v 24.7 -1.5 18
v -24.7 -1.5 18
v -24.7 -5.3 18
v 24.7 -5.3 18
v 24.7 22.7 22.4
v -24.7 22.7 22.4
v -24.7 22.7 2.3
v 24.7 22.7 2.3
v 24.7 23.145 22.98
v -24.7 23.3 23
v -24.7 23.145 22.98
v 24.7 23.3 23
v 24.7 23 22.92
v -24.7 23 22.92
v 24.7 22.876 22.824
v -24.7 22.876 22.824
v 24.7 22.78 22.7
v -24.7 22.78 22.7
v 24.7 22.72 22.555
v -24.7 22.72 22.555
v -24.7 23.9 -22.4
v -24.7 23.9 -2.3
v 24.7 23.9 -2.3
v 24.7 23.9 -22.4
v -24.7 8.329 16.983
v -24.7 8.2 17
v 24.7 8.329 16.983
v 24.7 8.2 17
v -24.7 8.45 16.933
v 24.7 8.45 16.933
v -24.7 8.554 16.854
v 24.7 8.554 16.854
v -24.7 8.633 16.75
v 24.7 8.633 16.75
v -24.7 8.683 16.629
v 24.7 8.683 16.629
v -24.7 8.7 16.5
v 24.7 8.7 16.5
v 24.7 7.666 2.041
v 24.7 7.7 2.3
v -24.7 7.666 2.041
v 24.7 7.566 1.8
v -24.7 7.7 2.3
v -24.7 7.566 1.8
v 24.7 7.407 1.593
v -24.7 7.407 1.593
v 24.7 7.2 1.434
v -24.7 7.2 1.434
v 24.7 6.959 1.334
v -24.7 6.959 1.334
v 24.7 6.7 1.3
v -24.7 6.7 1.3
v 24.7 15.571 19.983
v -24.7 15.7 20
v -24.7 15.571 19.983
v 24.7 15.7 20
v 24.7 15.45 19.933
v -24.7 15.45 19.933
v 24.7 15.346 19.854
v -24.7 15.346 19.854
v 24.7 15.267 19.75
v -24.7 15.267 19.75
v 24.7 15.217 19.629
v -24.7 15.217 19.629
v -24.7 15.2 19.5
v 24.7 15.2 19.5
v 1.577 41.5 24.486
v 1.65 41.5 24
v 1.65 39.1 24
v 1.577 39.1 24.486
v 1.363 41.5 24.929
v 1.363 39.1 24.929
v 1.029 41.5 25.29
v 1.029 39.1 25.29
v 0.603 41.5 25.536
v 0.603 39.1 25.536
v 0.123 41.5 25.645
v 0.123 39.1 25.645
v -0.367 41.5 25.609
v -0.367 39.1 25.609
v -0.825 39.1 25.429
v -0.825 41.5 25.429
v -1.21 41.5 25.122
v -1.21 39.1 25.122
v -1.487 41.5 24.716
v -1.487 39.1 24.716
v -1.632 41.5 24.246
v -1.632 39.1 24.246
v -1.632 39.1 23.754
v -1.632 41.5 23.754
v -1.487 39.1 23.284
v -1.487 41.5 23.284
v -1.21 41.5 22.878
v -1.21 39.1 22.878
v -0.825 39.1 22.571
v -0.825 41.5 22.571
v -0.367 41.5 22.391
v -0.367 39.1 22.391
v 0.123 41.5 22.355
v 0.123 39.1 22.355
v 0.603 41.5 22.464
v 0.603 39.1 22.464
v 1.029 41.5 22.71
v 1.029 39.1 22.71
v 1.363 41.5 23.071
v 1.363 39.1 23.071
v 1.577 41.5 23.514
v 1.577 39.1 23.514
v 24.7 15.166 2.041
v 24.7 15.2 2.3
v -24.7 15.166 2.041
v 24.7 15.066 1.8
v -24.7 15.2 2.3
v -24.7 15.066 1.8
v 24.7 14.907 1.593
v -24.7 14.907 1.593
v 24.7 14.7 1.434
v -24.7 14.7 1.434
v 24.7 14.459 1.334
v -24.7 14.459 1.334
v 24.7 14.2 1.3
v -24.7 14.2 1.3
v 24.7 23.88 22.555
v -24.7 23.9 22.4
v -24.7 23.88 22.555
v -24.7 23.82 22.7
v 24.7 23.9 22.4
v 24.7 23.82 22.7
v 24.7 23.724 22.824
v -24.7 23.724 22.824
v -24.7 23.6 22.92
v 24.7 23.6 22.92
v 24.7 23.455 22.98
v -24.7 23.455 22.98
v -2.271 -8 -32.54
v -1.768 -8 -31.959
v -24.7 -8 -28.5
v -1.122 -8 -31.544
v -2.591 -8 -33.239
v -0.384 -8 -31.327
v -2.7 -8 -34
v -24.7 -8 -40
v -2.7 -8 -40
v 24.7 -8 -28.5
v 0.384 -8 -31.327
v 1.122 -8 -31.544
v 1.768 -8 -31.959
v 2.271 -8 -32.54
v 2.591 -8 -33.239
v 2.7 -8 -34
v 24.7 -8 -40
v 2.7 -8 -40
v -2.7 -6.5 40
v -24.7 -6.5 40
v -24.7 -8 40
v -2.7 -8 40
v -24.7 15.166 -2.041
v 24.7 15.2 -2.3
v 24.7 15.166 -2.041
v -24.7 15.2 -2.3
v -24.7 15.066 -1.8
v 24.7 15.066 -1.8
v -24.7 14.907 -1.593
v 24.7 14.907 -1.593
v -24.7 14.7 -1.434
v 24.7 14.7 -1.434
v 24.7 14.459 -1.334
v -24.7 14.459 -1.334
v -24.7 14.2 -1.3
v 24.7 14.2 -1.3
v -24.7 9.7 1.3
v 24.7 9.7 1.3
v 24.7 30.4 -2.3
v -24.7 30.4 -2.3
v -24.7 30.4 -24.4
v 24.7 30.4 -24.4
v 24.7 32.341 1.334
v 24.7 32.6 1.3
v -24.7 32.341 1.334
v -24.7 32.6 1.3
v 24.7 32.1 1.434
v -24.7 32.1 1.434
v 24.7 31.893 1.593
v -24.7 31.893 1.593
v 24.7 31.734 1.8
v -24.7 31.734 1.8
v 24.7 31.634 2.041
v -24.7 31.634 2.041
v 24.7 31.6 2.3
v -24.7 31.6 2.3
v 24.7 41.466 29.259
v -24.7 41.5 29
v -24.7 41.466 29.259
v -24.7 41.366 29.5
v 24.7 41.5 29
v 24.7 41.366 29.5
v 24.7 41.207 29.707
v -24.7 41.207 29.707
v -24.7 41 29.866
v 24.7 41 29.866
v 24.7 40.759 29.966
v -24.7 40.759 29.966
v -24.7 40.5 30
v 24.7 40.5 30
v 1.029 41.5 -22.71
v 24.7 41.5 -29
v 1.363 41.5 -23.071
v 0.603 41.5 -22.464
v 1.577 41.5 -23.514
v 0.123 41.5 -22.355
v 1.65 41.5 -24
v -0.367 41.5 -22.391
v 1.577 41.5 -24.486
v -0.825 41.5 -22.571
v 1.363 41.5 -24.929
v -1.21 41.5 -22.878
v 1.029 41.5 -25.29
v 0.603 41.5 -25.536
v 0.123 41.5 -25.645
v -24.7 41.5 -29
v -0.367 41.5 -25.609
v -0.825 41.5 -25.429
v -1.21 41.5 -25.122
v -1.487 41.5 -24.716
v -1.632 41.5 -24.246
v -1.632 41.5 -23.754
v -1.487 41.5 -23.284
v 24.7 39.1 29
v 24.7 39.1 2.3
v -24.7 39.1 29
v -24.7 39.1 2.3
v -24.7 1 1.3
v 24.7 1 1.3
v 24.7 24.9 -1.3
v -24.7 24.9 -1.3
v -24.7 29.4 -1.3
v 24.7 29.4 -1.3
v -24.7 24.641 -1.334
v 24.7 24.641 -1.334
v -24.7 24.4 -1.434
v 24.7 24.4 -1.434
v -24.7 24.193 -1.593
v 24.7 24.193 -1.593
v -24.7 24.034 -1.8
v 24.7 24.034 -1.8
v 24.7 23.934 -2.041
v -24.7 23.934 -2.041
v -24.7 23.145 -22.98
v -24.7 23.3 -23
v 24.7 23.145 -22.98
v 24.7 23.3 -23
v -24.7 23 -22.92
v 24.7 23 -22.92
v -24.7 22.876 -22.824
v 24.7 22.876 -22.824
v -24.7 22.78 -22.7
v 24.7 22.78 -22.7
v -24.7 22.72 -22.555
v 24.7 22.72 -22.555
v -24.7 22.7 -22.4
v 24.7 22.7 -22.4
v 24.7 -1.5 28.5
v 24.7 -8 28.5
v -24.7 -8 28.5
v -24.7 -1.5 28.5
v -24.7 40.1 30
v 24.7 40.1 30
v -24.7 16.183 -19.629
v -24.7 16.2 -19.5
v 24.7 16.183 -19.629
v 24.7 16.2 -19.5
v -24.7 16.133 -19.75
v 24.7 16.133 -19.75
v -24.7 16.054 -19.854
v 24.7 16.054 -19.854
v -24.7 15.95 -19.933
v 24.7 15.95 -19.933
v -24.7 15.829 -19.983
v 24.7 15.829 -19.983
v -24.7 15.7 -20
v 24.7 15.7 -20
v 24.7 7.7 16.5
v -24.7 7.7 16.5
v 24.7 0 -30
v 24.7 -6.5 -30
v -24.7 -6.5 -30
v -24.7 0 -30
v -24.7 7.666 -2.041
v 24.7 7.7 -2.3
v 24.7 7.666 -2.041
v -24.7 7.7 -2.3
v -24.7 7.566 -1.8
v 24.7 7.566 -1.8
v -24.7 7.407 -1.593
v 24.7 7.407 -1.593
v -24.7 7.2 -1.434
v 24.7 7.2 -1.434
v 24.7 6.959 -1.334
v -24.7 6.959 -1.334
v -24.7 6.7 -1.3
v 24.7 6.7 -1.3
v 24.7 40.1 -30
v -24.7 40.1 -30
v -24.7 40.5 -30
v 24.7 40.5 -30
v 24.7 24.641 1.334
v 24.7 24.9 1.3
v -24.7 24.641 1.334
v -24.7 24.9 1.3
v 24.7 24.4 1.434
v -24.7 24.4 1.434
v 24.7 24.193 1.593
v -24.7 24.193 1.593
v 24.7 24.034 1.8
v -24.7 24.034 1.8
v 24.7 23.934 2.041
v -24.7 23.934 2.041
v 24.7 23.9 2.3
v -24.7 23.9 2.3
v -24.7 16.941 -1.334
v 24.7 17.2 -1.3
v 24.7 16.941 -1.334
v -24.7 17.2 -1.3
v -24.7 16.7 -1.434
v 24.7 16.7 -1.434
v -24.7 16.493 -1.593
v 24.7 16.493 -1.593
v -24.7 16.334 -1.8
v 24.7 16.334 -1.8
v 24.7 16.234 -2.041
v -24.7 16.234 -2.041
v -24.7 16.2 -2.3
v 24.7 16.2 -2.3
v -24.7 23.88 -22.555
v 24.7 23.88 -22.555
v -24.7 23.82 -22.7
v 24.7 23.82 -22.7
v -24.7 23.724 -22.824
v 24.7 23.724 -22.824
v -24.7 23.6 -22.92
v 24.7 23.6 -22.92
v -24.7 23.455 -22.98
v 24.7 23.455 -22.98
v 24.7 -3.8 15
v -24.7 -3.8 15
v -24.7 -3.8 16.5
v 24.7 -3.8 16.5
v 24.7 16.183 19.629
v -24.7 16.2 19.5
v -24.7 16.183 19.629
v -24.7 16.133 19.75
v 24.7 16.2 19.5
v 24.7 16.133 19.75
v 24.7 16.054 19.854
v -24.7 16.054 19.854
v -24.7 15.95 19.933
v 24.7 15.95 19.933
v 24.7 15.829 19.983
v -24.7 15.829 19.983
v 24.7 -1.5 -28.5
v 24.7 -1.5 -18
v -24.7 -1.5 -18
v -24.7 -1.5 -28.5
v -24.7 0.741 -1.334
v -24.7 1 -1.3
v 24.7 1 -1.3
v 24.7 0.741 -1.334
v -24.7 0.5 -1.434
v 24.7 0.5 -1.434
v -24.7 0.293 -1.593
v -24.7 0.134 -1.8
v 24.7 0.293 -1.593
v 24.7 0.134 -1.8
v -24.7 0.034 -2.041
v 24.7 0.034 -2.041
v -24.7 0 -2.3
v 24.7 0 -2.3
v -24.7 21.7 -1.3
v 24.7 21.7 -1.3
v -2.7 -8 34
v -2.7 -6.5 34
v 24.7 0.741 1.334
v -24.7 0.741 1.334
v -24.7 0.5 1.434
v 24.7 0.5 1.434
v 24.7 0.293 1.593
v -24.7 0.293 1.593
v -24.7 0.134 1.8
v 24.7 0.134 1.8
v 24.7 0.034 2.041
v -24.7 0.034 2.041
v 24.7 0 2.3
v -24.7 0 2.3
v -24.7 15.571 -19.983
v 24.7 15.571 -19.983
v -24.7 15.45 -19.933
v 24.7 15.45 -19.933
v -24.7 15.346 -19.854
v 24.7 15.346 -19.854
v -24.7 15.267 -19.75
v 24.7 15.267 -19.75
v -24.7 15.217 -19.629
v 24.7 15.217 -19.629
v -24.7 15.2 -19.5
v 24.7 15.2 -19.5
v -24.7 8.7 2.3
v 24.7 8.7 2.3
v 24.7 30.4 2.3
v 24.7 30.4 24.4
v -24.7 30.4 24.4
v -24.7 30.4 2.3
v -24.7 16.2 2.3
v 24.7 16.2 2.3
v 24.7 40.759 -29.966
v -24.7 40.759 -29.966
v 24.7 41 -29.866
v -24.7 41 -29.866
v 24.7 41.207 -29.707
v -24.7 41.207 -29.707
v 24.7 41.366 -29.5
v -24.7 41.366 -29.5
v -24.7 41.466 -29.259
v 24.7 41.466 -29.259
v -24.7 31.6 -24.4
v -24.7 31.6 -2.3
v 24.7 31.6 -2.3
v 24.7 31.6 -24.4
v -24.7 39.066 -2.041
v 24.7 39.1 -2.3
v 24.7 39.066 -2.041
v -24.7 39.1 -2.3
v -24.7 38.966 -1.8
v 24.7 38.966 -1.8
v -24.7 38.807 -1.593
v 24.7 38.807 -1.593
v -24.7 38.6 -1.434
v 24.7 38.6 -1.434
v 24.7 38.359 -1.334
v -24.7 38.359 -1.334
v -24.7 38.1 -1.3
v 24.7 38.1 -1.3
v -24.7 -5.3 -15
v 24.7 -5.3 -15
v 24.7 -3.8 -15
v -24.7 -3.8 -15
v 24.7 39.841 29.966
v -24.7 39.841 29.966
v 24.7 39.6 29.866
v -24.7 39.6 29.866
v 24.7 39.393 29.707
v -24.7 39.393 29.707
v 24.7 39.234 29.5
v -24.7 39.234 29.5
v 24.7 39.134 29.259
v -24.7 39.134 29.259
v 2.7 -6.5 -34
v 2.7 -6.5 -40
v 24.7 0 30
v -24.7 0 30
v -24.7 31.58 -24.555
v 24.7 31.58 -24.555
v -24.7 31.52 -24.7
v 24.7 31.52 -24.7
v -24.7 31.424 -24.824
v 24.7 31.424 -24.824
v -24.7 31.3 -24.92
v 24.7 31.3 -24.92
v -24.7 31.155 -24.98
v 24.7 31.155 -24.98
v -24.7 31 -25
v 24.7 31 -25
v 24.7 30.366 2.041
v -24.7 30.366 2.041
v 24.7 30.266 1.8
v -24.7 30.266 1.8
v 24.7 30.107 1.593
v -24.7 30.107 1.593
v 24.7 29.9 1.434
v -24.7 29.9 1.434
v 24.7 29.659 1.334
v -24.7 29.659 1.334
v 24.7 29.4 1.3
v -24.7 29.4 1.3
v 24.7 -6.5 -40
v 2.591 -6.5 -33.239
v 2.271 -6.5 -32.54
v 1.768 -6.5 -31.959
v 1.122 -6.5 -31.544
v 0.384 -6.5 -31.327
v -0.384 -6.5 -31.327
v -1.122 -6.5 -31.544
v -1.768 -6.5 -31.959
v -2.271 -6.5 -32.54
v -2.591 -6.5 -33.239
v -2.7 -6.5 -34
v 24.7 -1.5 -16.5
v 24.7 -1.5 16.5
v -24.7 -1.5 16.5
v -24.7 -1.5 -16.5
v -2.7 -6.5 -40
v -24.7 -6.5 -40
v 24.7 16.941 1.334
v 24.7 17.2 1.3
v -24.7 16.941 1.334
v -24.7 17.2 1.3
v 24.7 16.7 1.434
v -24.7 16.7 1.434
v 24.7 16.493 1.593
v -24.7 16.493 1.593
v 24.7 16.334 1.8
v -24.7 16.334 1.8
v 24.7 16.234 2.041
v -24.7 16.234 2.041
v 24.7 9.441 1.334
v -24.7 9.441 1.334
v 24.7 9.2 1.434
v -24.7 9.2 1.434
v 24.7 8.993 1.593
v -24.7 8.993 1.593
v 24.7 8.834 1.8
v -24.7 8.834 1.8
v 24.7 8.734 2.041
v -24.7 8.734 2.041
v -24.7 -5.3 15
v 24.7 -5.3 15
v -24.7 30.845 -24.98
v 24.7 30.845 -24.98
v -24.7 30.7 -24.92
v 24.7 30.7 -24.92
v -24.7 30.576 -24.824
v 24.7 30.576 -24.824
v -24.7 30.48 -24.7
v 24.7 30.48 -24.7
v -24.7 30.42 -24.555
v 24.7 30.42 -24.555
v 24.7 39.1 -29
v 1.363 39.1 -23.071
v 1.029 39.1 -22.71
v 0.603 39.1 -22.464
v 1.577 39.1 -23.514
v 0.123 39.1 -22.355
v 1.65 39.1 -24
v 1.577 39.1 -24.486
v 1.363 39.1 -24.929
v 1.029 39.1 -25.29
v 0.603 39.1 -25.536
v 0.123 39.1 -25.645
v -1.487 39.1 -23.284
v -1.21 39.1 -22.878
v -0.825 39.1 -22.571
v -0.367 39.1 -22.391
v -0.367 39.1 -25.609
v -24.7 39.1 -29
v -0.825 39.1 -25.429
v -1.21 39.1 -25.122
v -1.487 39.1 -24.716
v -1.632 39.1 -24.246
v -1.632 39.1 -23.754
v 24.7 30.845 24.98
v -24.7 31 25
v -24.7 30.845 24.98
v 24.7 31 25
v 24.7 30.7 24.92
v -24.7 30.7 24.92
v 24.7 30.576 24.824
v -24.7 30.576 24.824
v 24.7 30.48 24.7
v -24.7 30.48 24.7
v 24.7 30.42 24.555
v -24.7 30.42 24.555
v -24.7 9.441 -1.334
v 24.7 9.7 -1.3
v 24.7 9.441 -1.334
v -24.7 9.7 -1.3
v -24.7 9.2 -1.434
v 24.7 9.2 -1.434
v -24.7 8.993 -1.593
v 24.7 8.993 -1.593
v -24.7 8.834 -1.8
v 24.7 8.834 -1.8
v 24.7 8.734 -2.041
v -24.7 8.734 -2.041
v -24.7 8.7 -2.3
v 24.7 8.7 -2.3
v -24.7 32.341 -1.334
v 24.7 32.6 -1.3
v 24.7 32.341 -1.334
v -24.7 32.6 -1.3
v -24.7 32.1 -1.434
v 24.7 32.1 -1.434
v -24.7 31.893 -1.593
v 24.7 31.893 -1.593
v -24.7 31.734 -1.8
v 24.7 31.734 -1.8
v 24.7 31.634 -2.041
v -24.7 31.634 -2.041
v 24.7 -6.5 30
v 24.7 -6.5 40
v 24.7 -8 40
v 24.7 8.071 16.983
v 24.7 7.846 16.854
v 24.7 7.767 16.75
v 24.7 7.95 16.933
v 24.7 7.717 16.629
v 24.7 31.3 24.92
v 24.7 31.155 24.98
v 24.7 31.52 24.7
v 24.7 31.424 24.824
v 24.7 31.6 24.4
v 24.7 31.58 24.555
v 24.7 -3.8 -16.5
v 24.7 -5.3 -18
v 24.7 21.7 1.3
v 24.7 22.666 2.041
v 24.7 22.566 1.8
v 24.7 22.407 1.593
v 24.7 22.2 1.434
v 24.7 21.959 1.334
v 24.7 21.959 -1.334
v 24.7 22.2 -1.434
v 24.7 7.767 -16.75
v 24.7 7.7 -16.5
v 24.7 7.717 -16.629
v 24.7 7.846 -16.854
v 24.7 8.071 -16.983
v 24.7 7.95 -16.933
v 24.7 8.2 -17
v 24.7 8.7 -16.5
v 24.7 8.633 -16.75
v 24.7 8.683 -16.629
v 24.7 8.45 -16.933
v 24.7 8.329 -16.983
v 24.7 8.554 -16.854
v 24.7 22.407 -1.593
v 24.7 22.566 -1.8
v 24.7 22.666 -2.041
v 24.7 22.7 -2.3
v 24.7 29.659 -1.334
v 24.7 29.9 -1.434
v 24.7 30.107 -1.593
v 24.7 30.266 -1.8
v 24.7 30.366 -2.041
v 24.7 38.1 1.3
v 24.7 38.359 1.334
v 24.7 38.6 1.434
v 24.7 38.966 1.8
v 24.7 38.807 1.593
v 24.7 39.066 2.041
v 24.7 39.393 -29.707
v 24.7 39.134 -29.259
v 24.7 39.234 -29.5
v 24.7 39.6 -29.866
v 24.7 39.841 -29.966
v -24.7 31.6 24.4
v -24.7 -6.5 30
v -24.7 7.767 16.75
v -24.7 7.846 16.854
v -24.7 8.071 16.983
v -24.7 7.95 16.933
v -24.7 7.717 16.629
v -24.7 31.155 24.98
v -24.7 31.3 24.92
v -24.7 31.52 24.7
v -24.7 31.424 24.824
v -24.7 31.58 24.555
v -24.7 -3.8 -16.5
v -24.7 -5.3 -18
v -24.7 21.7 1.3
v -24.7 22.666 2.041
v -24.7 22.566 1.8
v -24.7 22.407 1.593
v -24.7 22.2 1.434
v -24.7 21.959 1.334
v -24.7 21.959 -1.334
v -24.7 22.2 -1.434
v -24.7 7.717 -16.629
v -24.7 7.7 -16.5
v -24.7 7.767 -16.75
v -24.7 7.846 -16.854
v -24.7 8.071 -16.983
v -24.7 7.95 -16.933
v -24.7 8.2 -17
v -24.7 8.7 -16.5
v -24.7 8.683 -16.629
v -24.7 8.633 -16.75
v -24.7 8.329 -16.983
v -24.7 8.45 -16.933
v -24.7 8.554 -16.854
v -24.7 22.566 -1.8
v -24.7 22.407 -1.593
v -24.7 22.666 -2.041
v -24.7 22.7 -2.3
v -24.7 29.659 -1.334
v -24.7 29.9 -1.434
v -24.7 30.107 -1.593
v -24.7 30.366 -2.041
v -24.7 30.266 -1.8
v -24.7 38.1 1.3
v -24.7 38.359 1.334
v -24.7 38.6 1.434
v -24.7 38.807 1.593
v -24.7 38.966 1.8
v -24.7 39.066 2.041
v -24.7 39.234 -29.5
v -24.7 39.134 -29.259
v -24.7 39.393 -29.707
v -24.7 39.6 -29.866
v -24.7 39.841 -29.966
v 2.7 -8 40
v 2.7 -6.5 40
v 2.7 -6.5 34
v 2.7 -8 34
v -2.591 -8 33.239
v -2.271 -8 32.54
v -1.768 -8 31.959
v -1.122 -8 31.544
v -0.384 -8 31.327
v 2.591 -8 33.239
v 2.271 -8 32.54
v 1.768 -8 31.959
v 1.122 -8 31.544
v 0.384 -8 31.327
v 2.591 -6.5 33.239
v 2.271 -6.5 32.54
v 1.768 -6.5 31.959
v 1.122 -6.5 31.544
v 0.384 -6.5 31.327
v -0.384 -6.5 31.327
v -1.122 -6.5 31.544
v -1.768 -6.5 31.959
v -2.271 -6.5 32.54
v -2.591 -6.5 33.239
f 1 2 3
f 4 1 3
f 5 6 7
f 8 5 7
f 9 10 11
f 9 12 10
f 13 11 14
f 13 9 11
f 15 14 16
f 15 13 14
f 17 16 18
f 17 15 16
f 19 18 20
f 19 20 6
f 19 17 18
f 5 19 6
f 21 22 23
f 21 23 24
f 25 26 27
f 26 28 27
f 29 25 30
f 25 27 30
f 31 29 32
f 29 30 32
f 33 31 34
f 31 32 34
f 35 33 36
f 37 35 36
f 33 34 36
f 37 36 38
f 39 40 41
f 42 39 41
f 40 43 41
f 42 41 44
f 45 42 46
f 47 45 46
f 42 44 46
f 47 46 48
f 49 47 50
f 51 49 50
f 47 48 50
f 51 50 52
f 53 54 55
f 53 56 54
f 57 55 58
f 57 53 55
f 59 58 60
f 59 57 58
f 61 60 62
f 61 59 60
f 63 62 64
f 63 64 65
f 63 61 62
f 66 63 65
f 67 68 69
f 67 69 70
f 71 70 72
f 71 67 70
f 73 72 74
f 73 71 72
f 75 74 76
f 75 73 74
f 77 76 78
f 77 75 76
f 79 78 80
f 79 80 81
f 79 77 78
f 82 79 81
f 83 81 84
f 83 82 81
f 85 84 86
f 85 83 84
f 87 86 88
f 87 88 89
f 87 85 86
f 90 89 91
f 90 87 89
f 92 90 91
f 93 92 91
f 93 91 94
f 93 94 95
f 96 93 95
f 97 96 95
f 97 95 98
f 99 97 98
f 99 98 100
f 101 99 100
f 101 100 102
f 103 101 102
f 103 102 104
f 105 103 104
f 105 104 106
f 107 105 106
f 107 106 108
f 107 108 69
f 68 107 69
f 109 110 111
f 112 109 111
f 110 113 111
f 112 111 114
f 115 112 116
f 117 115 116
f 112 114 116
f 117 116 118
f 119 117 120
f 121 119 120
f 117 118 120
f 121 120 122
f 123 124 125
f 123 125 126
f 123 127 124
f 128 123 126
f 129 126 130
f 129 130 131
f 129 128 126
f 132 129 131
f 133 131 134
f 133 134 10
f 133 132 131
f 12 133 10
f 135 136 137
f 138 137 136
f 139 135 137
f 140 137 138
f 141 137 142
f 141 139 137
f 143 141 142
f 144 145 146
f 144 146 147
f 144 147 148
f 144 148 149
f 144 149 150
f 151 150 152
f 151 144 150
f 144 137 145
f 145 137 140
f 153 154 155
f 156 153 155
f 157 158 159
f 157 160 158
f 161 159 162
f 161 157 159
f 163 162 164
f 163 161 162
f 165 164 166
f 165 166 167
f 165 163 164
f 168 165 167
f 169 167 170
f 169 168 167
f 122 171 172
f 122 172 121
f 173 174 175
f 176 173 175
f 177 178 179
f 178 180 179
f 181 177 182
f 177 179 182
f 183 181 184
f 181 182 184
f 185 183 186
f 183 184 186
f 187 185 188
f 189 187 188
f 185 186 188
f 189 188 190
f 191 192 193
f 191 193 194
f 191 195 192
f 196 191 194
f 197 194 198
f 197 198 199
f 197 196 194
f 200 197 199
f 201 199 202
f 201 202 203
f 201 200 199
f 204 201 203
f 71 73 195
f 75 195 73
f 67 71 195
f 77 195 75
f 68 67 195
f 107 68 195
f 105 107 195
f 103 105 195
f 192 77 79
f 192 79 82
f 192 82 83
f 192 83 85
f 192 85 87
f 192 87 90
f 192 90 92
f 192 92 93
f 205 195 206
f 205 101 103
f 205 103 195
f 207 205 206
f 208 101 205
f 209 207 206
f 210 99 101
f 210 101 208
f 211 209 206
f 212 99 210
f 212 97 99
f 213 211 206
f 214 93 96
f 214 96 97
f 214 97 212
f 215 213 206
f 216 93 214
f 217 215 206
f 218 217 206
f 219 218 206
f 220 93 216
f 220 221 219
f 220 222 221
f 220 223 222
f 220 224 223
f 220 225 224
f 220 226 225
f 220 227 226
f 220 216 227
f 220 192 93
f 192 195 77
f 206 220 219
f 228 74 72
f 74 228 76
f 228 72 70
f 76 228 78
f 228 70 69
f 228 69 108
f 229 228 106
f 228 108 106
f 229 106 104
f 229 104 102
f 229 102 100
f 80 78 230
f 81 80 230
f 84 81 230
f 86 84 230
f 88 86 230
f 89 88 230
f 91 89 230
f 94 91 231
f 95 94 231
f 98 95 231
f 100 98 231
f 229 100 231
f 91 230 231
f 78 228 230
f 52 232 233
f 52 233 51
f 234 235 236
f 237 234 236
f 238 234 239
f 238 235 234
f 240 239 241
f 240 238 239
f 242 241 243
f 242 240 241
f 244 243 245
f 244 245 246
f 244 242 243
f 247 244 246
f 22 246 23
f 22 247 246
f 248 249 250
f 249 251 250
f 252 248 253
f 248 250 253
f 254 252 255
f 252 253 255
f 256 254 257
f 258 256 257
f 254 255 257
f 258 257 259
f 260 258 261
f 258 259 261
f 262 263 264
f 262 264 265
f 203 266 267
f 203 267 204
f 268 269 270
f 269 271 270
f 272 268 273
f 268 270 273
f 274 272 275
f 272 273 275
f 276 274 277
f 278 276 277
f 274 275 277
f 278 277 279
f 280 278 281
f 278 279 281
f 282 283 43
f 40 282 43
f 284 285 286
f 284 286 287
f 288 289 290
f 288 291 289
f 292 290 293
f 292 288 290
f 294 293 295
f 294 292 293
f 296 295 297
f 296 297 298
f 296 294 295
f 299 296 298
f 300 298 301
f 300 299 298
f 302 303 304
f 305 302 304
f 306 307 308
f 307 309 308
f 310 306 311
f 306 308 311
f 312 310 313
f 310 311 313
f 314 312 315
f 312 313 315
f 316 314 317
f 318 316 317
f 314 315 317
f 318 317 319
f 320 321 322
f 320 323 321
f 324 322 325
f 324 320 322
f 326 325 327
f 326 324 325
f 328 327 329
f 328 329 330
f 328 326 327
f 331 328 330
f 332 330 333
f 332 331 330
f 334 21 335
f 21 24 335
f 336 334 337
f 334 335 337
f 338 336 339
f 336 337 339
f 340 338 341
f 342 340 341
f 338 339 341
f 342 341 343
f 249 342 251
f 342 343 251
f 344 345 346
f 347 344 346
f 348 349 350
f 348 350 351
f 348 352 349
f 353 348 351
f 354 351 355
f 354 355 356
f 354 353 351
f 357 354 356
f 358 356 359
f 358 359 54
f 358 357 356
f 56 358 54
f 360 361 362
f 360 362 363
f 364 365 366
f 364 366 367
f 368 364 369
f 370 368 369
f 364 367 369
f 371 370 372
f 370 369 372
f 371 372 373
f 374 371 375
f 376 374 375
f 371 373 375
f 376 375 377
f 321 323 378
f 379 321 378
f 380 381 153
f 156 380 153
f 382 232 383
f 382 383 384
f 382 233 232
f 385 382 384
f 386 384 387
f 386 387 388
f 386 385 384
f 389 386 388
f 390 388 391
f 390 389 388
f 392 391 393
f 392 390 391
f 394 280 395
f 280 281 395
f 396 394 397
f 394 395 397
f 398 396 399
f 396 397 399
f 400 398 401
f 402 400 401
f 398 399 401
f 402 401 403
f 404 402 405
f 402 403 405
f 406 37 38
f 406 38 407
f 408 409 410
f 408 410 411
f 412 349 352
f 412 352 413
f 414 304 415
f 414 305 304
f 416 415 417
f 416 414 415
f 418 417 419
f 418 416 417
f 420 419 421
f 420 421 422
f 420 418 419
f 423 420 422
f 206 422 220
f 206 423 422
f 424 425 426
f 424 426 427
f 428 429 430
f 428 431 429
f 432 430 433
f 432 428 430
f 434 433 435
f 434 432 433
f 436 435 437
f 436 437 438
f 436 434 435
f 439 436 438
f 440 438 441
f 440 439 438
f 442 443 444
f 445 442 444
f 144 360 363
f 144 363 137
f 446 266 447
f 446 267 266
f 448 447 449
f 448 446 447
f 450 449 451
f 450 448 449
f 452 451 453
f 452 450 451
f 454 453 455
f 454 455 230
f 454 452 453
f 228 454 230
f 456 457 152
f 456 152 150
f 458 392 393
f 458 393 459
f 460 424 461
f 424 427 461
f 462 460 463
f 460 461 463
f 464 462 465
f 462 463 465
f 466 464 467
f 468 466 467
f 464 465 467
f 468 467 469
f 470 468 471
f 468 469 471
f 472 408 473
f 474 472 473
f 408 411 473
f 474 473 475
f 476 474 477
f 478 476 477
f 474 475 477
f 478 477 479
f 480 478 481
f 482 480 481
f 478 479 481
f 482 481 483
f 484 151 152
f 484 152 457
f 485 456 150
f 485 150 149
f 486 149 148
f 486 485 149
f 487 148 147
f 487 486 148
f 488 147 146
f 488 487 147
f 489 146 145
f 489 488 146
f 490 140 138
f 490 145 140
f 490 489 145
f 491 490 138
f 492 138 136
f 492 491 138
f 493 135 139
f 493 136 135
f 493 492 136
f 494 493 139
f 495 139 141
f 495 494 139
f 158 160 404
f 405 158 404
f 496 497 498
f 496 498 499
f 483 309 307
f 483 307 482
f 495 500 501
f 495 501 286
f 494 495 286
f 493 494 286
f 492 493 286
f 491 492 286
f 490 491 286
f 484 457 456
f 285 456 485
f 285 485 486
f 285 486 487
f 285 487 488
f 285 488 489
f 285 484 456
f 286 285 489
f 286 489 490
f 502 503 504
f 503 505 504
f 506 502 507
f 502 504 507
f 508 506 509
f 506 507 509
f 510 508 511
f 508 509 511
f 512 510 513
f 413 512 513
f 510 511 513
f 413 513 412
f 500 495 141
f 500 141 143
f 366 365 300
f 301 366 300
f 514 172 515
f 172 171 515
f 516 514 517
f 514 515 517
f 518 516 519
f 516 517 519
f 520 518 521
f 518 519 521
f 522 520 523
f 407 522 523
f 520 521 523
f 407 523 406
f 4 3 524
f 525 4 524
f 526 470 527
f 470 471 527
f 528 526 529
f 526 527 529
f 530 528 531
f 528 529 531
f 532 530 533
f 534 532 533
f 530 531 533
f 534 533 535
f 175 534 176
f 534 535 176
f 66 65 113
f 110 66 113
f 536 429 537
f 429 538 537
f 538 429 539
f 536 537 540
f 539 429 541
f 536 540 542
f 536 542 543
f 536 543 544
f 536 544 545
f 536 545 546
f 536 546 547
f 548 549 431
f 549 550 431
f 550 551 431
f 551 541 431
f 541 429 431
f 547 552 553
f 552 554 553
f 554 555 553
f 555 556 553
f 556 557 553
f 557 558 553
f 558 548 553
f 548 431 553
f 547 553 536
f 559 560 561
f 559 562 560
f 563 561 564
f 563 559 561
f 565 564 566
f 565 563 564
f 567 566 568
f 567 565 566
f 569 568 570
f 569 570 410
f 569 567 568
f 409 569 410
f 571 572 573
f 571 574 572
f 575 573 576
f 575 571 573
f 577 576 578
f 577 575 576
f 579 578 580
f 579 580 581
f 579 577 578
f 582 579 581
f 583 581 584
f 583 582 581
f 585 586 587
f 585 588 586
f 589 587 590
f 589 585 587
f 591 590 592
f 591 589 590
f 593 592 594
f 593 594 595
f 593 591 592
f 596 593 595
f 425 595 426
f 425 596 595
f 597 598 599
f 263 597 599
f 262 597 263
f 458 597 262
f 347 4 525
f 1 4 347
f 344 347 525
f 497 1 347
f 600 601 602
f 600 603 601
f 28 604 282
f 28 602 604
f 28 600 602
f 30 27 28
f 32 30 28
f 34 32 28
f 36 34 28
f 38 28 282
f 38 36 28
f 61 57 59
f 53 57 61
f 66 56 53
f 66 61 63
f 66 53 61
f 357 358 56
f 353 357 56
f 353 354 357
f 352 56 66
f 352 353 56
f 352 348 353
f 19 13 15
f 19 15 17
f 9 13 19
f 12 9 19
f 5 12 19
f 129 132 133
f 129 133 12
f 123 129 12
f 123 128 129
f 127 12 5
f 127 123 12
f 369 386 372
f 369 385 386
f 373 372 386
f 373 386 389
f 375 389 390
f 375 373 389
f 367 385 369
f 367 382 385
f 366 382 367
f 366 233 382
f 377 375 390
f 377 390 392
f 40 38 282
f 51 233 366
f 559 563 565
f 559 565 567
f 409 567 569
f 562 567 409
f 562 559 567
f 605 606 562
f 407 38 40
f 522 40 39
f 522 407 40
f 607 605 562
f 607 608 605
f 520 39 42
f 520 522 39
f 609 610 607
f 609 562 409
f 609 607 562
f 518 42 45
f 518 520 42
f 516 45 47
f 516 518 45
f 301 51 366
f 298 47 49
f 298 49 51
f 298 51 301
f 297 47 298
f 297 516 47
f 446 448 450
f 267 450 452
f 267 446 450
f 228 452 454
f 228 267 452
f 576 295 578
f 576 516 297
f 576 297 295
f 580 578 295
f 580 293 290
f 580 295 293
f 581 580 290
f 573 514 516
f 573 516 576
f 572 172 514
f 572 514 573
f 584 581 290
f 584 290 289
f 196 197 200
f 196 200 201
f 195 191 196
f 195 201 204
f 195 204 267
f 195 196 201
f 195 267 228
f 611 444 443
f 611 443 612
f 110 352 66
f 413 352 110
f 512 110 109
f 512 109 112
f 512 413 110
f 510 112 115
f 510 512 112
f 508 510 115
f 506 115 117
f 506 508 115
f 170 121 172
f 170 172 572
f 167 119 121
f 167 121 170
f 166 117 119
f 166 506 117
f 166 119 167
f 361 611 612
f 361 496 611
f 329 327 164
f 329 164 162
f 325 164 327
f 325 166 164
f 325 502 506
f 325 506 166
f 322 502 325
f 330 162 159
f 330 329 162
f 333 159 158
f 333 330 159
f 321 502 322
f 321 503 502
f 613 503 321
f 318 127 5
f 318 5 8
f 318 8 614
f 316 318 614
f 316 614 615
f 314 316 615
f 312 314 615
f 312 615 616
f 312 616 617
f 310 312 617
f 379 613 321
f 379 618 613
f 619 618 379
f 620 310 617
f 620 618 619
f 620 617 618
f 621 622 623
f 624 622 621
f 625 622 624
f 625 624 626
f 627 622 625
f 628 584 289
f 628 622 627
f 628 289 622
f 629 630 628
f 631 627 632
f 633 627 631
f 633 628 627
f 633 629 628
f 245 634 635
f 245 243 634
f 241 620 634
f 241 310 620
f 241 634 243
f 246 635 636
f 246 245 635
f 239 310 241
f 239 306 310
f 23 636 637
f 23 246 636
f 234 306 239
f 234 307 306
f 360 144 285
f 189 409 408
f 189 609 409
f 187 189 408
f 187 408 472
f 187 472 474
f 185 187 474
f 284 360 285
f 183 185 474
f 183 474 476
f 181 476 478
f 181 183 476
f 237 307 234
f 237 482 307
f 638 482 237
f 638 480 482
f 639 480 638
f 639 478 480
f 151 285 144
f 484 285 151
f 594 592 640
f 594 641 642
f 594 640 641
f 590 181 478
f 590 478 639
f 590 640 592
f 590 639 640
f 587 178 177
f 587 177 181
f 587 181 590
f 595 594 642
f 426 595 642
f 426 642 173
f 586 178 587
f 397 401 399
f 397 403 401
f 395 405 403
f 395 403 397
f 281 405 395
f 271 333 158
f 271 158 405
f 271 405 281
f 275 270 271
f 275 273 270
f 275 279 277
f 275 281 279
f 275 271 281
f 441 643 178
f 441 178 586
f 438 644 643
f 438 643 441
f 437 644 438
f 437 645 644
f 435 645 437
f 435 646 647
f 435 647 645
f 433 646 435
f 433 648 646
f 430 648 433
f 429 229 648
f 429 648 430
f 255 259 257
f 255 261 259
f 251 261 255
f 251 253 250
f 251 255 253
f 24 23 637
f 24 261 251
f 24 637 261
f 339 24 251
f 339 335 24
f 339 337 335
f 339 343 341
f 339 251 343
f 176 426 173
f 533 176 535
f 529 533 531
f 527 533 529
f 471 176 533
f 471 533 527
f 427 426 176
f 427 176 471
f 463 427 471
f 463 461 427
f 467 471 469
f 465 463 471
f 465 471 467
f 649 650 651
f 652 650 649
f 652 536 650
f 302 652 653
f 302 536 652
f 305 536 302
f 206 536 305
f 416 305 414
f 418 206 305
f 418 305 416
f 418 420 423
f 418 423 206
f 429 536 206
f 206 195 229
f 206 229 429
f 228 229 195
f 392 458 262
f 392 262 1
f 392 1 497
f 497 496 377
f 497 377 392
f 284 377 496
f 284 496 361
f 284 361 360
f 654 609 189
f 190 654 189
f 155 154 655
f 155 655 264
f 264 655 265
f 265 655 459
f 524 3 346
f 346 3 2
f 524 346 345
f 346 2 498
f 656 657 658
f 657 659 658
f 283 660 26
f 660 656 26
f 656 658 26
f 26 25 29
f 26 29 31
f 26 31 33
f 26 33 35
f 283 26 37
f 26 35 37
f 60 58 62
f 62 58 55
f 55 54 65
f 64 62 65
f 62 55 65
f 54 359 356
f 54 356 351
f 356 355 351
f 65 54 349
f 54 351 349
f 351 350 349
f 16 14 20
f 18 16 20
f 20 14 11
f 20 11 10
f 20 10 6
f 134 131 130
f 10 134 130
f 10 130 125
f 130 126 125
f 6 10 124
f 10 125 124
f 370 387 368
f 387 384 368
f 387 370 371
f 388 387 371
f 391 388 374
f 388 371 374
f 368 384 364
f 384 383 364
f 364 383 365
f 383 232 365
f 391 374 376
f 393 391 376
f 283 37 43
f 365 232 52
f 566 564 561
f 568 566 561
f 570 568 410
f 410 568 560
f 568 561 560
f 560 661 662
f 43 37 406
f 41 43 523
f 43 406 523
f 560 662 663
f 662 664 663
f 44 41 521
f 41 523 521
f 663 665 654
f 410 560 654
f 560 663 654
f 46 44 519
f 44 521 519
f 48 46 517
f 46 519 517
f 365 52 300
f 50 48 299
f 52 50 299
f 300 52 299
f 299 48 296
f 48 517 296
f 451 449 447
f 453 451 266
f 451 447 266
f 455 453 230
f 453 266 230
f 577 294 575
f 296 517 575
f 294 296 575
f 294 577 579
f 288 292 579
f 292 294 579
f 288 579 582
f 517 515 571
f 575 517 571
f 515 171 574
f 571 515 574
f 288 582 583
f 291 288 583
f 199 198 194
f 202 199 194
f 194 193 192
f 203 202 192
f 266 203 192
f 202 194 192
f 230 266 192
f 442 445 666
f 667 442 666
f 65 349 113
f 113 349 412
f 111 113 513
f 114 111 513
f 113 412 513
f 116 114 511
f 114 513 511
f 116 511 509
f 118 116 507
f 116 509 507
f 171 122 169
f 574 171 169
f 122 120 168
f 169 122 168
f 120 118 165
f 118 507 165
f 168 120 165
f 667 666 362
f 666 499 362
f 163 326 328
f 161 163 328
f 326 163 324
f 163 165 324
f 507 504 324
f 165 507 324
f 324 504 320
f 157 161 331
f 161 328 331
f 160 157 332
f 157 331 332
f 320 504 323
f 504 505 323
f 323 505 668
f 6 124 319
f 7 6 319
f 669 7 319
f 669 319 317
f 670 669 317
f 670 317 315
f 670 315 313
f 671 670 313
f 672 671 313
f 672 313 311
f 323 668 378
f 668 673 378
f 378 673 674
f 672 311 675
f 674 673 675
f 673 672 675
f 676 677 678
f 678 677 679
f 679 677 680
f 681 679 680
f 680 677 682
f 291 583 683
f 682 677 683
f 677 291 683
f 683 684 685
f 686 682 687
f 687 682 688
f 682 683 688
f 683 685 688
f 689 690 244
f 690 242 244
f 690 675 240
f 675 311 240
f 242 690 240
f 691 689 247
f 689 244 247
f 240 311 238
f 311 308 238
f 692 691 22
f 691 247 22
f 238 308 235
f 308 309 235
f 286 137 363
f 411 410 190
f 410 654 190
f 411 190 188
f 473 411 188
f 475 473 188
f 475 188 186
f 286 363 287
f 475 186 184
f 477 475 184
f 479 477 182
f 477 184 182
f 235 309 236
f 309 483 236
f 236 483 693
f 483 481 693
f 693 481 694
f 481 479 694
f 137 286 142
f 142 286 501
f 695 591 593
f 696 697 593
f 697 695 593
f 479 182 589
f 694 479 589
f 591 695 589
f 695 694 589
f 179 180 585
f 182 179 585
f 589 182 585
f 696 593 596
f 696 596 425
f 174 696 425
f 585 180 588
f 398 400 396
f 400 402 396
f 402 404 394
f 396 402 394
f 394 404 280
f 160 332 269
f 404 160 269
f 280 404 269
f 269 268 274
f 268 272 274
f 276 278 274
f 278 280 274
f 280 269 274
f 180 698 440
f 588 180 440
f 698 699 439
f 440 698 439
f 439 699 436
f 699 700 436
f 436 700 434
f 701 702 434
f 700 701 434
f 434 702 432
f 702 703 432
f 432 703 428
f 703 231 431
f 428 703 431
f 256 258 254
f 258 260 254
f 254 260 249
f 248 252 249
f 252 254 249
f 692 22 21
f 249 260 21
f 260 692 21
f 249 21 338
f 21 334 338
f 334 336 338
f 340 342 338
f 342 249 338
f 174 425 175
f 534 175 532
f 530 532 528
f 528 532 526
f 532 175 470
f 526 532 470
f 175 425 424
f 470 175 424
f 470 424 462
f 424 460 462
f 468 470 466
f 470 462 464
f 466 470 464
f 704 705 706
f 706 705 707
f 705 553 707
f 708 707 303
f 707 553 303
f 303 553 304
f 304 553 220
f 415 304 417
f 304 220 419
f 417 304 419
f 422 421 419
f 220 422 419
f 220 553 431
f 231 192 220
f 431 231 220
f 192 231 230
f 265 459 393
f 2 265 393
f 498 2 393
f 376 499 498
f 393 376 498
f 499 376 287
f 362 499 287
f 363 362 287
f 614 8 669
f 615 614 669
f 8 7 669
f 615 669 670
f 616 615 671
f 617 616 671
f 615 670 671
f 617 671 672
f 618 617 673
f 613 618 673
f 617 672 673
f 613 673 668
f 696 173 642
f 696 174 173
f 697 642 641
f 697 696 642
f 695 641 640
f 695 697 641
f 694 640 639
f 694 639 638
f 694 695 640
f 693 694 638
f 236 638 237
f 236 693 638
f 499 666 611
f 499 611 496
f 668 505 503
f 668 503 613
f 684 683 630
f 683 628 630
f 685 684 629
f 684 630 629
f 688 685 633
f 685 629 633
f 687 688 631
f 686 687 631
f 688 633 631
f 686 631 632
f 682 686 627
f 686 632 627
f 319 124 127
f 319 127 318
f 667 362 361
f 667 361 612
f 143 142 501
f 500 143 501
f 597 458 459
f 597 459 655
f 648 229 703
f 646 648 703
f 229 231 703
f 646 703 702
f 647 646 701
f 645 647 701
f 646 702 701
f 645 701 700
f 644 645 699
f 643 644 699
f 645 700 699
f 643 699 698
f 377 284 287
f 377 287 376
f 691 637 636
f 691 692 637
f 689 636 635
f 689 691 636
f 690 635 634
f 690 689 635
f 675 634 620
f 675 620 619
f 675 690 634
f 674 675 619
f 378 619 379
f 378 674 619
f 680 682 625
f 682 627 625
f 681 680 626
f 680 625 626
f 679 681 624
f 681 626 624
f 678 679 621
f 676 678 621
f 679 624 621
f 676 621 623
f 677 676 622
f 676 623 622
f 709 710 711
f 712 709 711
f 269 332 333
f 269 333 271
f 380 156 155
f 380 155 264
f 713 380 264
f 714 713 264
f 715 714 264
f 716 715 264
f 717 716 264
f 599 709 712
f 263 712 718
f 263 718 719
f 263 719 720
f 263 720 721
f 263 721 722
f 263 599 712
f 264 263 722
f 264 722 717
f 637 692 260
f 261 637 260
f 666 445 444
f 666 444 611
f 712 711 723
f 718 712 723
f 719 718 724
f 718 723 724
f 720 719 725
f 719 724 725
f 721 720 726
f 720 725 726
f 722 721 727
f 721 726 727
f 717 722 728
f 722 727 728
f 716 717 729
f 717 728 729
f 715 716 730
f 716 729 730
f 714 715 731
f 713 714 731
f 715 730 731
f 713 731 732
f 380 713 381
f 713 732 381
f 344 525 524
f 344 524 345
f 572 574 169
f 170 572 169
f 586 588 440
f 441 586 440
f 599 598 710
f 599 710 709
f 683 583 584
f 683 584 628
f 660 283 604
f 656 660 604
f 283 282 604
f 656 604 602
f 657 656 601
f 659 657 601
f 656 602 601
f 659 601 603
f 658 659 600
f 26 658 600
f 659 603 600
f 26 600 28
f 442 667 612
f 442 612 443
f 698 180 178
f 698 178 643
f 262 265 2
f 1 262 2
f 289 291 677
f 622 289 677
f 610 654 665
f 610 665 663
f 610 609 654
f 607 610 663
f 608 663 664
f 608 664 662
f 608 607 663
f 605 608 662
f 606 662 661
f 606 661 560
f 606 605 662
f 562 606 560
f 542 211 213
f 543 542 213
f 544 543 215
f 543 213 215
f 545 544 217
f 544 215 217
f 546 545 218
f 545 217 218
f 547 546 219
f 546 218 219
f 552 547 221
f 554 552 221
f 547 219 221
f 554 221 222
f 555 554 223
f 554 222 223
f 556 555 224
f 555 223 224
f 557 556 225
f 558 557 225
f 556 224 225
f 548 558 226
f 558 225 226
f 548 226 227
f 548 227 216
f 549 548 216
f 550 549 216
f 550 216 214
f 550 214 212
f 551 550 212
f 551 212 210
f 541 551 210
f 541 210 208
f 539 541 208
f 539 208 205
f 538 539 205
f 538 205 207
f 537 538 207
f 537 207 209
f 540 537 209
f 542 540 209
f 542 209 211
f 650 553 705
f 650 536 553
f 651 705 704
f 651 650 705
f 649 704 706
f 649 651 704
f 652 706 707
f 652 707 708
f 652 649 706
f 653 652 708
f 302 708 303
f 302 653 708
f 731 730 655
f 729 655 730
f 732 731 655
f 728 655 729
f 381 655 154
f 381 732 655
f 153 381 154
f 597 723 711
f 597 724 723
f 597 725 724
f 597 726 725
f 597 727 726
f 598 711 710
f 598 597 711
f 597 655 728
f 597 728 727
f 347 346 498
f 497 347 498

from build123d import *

# Parameters (mm, degrees)
BASE_DEPTH                 = 24.7
DINRAILLEG_START           = -24.7
DINRAILLEG_DEPTH           = 49.4
MAINRIB_START              = -24.7
MAINRIBS_W                 = 2.6
MAINRIBS_H                 = 41.5
MAINRIB_DEPTH              = 49.4
TOPBASE_START              = -24.7
TOPBASES_W                 = 60
TOPBASES_H                 = 2.4
TOPBASE_DEPTH              = 49.4
RIB1_START                 = -24.7
RIB1S_W                    = 50
RIB1S_H                    = 1.2
RIB1_DEPTH                 = 49.4
RIB2_START                 = -24.7
RIB2S_W                    = 46
RIB2S_H                    = 1.2
RIB2_DEPTH                 = 49.4
RIB3_START                 = -24.7
RIB3S_W                    = 40
RIB3S_H                    = 1
RIB3_DEPTH                 = 49.4
RIB4_START                 = -24.7
RIB4S_W                    = 34
RIB4S_H                    = 1
RIB4_DEPTH                 = 49.4
MOUNTINGSLOT_DEPTH         = 68.186977905
M4X0_7_TAPPED_HOLE1_REACH  = 70.267
M4X0_7_TAPPED_HOLE1_BORE_R = 1.65
TBF_R                      = 1
MRF_R                      = 1
FILLET_F1_R                = 0.6
FILLET_F2_R                = 0.6
FILLET_F3_R                = 0.5
FILLET_F4_R                = 0.5


with BuildPart() as part:
    # BaseS → Base (new, symmetric)
    with BuildSketch(Plane(origin=(0, 0, 0), x_dir=(0, 0, -1), z_dir=(1, 0, 0))):
        Polygon((40, -6.5), (30, -6.5), (30, 0), (-30, 0), (-30, -6.5), (-40, -6.5), (-40, -8), (-28.5, -8), (-28.5, -1.5), (28.5, -1.5), (28.5, -8), (40, -8), align=None)
    extrude(amount=BASE_DEPTH, both=True)

    # DinRailLegS → DinRailLeg (add)
    with BuildSketch(Plane(origin=(0, 0, 0), x_dir=(0, 0, -1), z_dir=(1, 0, 0)).offset(DINRAILLEG_START)):
        Polygon((18, -1.5), (18, -5.3), (15, -5.3), (15, -3.8), (16.5, -3.8), (16.5, -1.5), align=None)
    dinrailleg = extrude(amount=DINRAILLEG_DEPTH)

    # MainRibS → MainRib (add)
    with BuildSketch(Plane(origin=(0, 0, 0), x_dir=(0, 0, -1), z_dir=(1, 0, 0)).offset(MAINRIB_START)):
        with Locations((0, 20.75)):
            Rectangle(MAINRIBS_W, MAINRIBS_H)
    extrude(amount=MAINRIB_DEPTH)

    # TopBaseS → TopBase (add)
    with BuildSketch(Plane(origin=(0, 0, 0), x_dir=(0, 0, -1), z_dir=(1, 0, 0)).offset(TOPBASE_START)):
        with Locations((0, 40.3)):
            Rectangle(TOPBASES_W, TOPBASES_H)
    extrude(amount=TOPBASE_DEPTH)

    # Rib1S → Rib1 (add)
    with BuildSketch(Plane(origin=(0, 0, 0), x_dir=(0, 0, -1), z_dir=(1, 0, 0)).offset(RIB1_START)):
        with Locations((0, 31)):
            Rectangle(RIB1S_W, RIB1S_H)
    extrude(amount=RIB1_DEPTH)

    # Rib2S → Rib2 (add)
    with BuildSketch(Plane(origin=(0, 0, 0), x_dir=(0, 0, -1), z_dir=(1, 0, 0)).offset(RIB2_START)):
        with Locations((0, 23.3)):
            Rectangle(RIB2S_W, RIB2S_H)
    extrude(amount=RIB2_DEPTH)

    # Rib3S → Rib3 (add)
    with BuildSketch(Plane(origin=(0, 0, 0), x_dir=(0, 0, -1), z_dir=(1, 0, 0)).offset(RIB3_START)):
        with Locations((0, 15.7)):
            Rectangle(RIB3S_W, RIB3S_H)
    extrude(amount=RIB3_DEPTH)

    # Rib4S → Rib4 (add)
    with BuildSketch(Plane(origin=(0, 0, 0), x_dir=(0, 0, -1), z_dir=(1, 0, 0)).offset(RIB4_START)):
        with Locations((0, 8.2)):
            Rectangle(RIB4S_W, RIB4S_H)
    extrude(amount=RIB4_DEPTH)

    # MountingSlotS → MountingSlot (cut, through all)
    with BuildSketch(Plane(origin=(0, -6.5, 0), x_dir=(1, 0, 0), z_dir=(0, 1, 0))):
        with BuildLine():
            Line((2.7, 40), (2.7, 34))
            ThreePointArc((2.7, 34), (0, 31.3), (-2.7, 34))
            Line((-2.7, 34), (-2.7, 40))
            ThreePointArc((-2.7, 40), (0, 42.7), (2.7, 40))
        make_face()
    mountingslot = extrude(amount=-MOUNTINGSLOT_DEPTH, mode=Mode.SUBTRACT)

    # M4x0.7 Tapped Hole1 bore → M4x0.7 Tapped Hole1 (cut, up to next)
    with BuildSketch(Plane(origin=(0, 41.5, 0), x_dir=(1, 0, 0), z_dir=(0, 1, 0)), mode=Mode.PRIVATE) as m4x0_7_tapped_hole1_sk1:
        with Locations((0, 24)):
            Circle(M4X0_7_TAPPED_HOLE1_BORE_R)
    m4x0_7_tapped_hole1_tool1 = extrude(m4x0_7_tapped_hole1_sk1.sketch, amount=-M4X0_7_TAPPED_HOLE1_REACH, mode=Mode.PRIVATE) & part.part
    m4x0_7_tapped_hole1 = m4x0_7_tapped_hole1_tool1.solids().sort_by_distance((0, 41.5, -24))[0]
    add(m4x0_7_tapped_hole1, mode=Mode.SUBTRACT)

    # Mounting Features VM: DinRailLeg, MountingSlot, M4x0.7 Tapped Hole1 across plane
    add(dinrailleg.mirror(Plane.XY))
    add(mountingslot.mirror(Plane.XY), mode=Mode.SUBTRACT)
    add(m4x0_7_tapped_hole1.mirror(Plane.XY), mode=Mode.SUBTRACT)

    # TBF
    tbf_edges = [part.edges().sort_by_distance(p)[0] for p in [
        (0, 41.5, -30),
        (0, 39.1, 30),
        (0, 39.1, -30),
        (0, 41.5, 30),
    ]]
    fillet(tbf_edges, radius=TBF_R)

    # MRF
    mrf_edges = [part.edges().sort_by_distance(p)[0] for p in [
        (0, 23.9, -1.3),
        (0, 22.7, -1.3),
        (0, 22.7, 1.3),
        (0, 23.9, 1.3),
        (0, 15.2, -1.3),
        (0, 15.2, 1.3),
        (0, 16.2, -1.3),
        (0, 16.2, 1.3),
        (0, 7.7, -1.3),
        (0, 7.7, 1.3),
        (0, 8.7, -1.3),
        (0, 8.7, 1.3),
        (0, 0, -1.3),
        (0, 0, 1.3),
        (0, 39.1, 1.3),
        (0, 39.1, -1.3),
        (0, 31.6, -1.3),
        (0, 31.6, 1.3),
        (0, 30.4, -1.3),
        (0, 30.4, 1.3),
    ]]
    fillet(mrf_edges, radius=MRF_R)

    # Fillet F1
    fillet_f1_edges = [part.edges().sort_by_distance(p)[0] for p in [
        (0, 30.4, -25),
        (0, 31.6, -25),
        (0, 30.4, 25),
        (0, 31.6, 25),
    ]]
    fillet(fillet_f1_edges, radius=FILLET_F1_R - 0.0001)  # a hair under: the kernel refuses the full size

    # Fillet F2
    fillet_f2_edges = [part.edges().sort_by_distance(p)[0] for p in [
        (0, 23.9, -23),
        (0, 22.7, -23),
        (0, 23.9, 23),
        (0, 22.7, 23),
    ]]
    fillet(fillet_f2_edges, radius=FILLET_F2_R - 0.0001)  # a hair under: the kernel refuses the full size

    # Fillet F3
    fillet_f3_edges = [part.edges().sort_by_distance(p)[0] for p in [
        (0, 15.2, -20),
        (0, 16.2, -20),
        (0, 15.2, 20),
        (0, 16.2, 20),
    ]]
    fillet(fillet_f3_edges, radius=FILLET_F3_R - 0.0001)  # a hair under: the kernel refuses the full size

    # Fillet F4
    fillet_f4_edges = [part.edges().sort_by_distance(p)[0] for p in [
        (0, 8.7, 17),
        (0, 7.7, 17),
        (0, 7.7, -17),
        (0, 8.7, -17),
    ]]
    fillet(fillet_f4_edges, radius=FILLET_F4_R - 0.0001)  # a hair under: the kernel refuses the full size


solid = part.part
